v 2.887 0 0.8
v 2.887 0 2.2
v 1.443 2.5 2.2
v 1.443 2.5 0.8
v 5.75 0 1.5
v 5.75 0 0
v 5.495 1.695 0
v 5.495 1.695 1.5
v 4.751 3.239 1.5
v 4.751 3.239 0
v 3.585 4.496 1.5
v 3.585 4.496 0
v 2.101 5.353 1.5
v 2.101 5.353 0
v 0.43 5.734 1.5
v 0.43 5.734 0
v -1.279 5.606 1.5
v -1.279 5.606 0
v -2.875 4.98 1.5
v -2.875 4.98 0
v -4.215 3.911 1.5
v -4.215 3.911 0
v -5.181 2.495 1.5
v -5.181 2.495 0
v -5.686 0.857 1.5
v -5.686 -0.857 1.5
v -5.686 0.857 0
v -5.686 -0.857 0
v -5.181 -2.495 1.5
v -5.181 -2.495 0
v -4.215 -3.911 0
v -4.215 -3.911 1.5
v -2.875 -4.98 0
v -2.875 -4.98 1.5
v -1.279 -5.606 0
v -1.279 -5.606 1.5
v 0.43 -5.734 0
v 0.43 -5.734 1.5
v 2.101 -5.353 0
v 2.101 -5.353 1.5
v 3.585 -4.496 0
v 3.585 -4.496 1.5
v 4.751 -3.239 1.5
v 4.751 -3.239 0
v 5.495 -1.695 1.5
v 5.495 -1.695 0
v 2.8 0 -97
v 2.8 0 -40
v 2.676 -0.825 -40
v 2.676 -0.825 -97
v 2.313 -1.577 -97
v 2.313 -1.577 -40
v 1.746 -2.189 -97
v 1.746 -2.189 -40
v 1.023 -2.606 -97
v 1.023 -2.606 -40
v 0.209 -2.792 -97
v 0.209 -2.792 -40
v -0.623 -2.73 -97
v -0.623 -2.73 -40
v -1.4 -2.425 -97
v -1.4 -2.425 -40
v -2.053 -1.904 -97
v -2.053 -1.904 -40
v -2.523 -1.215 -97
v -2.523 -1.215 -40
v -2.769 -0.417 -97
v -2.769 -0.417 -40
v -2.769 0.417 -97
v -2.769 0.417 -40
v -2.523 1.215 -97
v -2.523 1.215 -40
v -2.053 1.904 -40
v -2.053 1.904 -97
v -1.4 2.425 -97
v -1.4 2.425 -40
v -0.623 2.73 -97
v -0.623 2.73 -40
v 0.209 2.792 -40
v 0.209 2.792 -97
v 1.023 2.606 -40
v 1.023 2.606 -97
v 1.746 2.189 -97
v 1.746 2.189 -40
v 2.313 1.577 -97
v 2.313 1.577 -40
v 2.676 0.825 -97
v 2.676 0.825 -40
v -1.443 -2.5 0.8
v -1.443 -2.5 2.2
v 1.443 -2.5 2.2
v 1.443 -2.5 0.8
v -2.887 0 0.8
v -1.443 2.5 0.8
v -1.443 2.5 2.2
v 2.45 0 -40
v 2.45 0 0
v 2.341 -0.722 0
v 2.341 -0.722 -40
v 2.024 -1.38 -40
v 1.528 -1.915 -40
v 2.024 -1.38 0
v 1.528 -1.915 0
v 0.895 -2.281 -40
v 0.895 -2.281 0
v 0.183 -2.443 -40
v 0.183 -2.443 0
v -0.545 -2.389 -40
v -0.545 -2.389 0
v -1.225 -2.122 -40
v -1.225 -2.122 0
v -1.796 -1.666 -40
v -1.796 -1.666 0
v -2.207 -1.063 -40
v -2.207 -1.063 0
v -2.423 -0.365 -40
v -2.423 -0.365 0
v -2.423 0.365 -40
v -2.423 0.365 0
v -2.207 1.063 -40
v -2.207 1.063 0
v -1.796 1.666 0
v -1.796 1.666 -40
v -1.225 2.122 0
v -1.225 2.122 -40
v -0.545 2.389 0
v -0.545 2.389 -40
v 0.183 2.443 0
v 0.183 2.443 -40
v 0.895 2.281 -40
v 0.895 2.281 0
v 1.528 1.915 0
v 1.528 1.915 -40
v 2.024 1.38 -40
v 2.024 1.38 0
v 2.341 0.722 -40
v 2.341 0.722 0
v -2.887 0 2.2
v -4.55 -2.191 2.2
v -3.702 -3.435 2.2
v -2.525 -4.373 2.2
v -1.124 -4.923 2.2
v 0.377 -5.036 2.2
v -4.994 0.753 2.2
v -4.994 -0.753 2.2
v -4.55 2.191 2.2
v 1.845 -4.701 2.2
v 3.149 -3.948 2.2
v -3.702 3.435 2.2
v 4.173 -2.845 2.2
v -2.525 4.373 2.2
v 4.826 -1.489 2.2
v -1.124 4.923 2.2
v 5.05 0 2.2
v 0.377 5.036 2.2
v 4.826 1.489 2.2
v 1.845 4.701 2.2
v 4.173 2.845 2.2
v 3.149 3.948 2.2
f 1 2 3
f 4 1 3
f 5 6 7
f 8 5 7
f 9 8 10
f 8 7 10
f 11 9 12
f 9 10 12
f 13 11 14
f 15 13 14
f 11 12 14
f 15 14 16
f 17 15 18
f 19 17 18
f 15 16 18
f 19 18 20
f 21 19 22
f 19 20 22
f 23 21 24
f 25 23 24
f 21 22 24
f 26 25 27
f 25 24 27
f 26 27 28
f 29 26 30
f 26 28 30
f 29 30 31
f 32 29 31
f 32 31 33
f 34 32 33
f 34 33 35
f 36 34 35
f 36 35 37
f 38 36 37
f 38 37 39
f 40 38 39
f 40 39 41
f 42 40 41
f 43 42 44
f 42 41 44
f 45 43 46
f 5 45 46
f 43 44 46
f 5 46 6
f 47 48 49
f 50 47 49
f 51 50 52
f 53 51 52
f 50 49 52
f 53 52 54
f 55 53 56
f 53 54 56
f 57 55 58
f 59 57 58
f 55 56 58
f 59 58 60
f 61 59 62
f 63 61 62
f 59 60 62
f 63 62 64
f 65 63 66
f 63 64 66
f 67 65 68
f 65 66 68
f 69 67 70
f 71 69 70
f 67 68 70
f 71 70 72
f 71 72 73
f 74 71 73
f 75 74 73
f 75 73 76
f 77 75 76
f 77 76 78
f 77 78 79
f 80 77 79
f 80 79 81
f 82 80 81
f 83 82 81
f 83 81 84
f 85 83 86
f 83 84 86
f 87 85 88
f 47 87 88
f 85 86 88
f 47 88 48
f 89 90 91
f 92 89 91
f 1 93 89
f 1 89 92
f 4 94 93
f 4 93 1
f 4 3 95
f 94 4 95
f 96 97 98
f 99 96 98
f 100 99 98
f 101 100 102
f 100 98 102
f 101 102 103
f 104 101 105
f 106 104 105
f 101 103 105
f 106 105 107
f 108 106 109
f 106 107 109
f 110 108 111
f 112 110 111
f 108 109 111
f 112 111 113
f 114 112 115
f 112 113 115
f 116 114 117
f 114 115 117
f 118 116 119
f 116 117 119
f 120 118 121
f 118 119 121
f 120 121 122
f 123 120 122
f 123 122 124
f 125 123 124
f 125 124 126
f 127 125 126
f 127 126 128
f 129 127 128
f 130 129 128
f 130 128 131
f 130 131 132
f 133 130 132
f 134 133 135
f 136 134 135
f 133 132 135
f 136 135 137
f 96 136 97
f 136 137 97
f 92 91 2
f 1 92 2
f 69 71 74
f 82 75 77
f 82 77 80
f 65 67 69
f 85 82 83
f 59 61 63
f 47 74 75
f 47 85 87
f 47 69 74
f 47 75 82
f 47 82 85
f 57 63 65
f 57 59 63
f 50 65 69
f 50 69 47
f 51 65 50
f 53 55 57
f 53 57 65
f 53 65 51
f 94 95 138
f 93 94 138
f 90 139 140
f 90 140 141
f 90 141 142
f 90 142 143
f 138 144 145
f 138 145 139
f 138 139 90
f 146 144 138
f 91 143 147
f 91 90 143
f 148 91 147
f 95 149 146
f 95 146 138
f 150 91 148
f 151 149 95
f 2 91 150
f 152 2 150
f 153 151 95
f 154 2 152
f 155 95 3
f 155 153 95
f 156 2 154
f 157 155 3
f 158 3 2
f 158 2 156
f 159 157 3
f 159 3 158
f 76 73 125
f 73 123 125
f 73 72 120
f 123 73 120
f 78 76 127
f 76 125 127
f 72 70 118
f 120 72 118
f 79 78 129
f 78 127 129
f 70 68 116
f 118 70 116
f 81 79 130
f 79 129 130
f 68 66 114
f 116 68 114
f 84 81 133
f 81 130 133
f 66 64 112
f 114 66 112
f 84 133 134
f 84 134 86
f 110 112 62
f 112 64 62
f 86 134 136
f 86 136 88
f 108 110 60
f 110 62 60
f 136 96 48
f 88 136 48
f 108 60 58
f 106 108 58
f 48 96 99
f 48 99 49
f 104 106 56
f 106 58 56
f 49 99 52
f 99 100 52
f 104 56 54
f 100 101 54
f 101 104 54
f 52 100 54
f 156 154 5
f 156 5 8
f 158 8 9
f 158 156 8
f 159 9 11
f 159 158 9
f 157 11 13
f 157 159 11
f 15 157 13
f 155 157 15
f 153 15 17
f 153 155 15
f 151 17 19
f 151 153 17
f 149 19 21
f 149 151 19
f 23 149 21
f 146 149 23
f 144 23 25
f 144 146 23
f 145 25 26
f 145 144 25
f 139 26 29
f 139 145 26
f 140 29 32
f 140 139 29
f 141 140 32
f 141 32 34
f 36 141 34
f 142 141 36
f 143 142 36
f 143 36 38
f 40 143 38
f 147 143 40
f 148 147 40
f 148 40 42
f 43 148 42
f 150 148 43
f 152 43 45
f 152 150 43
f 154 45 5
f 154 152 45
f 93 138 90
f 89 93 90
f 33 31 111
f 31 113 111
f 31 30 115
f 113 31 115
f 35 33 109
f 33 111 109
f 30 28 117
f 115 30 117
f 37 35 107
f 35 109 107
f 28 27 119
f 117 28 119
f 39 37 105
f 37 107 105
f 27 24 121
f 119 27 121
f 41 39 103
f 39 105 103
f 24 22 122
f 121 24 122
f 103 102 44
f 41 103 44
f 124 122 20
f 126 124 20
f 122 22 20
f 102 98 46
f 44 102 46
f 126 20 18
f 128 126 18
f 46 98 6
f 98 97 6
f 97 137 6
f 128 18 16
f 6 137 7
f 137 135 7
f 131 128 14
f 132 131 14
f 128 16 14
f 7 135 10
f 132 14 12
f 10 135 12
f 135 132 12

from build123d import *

# Parameters (mm, degrees)
SKETCH009_R     = 5.75
PAD005_DEPTH    = 2.2
POCKET_DEPTH    = 1.4
CHAMFER001_SIZE = 0.7
SKETCH011_R     = 2.45
PAD006_DEPTH    = 40
SKETCH012_R     = 2.8
PAD007_DEPTH    = 57


with BuildPart() as part:
    # Sketch009 → Pad005 (new body)
    with BuildSketch(Plane.XY):
        Circle(SKETCH009_R)
    extrude(amount=PAD005_DEPTH)

    # Sketch010 (on Face3 of Pad005) → Pocket (cut)
    with BuildSketch(Plane.XY.offset(2.2)):
        Polygon((2.886751, 0), (1.443376, 2.5), (-1.443376, 2.5), (-2.886751, 0), (-1.443376, -2.5), (1.443376, -2.5), align=None)
    extrude(amount=-POCKET_DEPTH, mode=Mode.SUBTRACT)

    # Chamfer001
    chamfer001_edges = [part.edges().sort_by_distance(p)[0] for p in [
        (-5.75, 0, 2.2),
    ]]
    chamfer(chamfer001_edges, length=CHAMFER001_SIZE)

    # Sketch011 (on Face3 of Chamfer001) → Pad006 (join)
    with BuildSketch(Plane(origin=(0, 0, 0), x_dir=(1, 0, 0), z_dir=(0, 0, -1))):
        Circle(SKETCH011_R)
    extrude(amount=PAD006_DEPTH)

    # Sketch012 (on Face12 of Pad006) → Pad007 (join)
    with BuildSketch(Plane(origin=(0, 0, -40), x_dir=(1, 0, 0), z_dir=(0, 0, -1))):
        Circle(SKETCH012_R)
    extrude(amount=PAD007_DEPTH)


solid = part.part
